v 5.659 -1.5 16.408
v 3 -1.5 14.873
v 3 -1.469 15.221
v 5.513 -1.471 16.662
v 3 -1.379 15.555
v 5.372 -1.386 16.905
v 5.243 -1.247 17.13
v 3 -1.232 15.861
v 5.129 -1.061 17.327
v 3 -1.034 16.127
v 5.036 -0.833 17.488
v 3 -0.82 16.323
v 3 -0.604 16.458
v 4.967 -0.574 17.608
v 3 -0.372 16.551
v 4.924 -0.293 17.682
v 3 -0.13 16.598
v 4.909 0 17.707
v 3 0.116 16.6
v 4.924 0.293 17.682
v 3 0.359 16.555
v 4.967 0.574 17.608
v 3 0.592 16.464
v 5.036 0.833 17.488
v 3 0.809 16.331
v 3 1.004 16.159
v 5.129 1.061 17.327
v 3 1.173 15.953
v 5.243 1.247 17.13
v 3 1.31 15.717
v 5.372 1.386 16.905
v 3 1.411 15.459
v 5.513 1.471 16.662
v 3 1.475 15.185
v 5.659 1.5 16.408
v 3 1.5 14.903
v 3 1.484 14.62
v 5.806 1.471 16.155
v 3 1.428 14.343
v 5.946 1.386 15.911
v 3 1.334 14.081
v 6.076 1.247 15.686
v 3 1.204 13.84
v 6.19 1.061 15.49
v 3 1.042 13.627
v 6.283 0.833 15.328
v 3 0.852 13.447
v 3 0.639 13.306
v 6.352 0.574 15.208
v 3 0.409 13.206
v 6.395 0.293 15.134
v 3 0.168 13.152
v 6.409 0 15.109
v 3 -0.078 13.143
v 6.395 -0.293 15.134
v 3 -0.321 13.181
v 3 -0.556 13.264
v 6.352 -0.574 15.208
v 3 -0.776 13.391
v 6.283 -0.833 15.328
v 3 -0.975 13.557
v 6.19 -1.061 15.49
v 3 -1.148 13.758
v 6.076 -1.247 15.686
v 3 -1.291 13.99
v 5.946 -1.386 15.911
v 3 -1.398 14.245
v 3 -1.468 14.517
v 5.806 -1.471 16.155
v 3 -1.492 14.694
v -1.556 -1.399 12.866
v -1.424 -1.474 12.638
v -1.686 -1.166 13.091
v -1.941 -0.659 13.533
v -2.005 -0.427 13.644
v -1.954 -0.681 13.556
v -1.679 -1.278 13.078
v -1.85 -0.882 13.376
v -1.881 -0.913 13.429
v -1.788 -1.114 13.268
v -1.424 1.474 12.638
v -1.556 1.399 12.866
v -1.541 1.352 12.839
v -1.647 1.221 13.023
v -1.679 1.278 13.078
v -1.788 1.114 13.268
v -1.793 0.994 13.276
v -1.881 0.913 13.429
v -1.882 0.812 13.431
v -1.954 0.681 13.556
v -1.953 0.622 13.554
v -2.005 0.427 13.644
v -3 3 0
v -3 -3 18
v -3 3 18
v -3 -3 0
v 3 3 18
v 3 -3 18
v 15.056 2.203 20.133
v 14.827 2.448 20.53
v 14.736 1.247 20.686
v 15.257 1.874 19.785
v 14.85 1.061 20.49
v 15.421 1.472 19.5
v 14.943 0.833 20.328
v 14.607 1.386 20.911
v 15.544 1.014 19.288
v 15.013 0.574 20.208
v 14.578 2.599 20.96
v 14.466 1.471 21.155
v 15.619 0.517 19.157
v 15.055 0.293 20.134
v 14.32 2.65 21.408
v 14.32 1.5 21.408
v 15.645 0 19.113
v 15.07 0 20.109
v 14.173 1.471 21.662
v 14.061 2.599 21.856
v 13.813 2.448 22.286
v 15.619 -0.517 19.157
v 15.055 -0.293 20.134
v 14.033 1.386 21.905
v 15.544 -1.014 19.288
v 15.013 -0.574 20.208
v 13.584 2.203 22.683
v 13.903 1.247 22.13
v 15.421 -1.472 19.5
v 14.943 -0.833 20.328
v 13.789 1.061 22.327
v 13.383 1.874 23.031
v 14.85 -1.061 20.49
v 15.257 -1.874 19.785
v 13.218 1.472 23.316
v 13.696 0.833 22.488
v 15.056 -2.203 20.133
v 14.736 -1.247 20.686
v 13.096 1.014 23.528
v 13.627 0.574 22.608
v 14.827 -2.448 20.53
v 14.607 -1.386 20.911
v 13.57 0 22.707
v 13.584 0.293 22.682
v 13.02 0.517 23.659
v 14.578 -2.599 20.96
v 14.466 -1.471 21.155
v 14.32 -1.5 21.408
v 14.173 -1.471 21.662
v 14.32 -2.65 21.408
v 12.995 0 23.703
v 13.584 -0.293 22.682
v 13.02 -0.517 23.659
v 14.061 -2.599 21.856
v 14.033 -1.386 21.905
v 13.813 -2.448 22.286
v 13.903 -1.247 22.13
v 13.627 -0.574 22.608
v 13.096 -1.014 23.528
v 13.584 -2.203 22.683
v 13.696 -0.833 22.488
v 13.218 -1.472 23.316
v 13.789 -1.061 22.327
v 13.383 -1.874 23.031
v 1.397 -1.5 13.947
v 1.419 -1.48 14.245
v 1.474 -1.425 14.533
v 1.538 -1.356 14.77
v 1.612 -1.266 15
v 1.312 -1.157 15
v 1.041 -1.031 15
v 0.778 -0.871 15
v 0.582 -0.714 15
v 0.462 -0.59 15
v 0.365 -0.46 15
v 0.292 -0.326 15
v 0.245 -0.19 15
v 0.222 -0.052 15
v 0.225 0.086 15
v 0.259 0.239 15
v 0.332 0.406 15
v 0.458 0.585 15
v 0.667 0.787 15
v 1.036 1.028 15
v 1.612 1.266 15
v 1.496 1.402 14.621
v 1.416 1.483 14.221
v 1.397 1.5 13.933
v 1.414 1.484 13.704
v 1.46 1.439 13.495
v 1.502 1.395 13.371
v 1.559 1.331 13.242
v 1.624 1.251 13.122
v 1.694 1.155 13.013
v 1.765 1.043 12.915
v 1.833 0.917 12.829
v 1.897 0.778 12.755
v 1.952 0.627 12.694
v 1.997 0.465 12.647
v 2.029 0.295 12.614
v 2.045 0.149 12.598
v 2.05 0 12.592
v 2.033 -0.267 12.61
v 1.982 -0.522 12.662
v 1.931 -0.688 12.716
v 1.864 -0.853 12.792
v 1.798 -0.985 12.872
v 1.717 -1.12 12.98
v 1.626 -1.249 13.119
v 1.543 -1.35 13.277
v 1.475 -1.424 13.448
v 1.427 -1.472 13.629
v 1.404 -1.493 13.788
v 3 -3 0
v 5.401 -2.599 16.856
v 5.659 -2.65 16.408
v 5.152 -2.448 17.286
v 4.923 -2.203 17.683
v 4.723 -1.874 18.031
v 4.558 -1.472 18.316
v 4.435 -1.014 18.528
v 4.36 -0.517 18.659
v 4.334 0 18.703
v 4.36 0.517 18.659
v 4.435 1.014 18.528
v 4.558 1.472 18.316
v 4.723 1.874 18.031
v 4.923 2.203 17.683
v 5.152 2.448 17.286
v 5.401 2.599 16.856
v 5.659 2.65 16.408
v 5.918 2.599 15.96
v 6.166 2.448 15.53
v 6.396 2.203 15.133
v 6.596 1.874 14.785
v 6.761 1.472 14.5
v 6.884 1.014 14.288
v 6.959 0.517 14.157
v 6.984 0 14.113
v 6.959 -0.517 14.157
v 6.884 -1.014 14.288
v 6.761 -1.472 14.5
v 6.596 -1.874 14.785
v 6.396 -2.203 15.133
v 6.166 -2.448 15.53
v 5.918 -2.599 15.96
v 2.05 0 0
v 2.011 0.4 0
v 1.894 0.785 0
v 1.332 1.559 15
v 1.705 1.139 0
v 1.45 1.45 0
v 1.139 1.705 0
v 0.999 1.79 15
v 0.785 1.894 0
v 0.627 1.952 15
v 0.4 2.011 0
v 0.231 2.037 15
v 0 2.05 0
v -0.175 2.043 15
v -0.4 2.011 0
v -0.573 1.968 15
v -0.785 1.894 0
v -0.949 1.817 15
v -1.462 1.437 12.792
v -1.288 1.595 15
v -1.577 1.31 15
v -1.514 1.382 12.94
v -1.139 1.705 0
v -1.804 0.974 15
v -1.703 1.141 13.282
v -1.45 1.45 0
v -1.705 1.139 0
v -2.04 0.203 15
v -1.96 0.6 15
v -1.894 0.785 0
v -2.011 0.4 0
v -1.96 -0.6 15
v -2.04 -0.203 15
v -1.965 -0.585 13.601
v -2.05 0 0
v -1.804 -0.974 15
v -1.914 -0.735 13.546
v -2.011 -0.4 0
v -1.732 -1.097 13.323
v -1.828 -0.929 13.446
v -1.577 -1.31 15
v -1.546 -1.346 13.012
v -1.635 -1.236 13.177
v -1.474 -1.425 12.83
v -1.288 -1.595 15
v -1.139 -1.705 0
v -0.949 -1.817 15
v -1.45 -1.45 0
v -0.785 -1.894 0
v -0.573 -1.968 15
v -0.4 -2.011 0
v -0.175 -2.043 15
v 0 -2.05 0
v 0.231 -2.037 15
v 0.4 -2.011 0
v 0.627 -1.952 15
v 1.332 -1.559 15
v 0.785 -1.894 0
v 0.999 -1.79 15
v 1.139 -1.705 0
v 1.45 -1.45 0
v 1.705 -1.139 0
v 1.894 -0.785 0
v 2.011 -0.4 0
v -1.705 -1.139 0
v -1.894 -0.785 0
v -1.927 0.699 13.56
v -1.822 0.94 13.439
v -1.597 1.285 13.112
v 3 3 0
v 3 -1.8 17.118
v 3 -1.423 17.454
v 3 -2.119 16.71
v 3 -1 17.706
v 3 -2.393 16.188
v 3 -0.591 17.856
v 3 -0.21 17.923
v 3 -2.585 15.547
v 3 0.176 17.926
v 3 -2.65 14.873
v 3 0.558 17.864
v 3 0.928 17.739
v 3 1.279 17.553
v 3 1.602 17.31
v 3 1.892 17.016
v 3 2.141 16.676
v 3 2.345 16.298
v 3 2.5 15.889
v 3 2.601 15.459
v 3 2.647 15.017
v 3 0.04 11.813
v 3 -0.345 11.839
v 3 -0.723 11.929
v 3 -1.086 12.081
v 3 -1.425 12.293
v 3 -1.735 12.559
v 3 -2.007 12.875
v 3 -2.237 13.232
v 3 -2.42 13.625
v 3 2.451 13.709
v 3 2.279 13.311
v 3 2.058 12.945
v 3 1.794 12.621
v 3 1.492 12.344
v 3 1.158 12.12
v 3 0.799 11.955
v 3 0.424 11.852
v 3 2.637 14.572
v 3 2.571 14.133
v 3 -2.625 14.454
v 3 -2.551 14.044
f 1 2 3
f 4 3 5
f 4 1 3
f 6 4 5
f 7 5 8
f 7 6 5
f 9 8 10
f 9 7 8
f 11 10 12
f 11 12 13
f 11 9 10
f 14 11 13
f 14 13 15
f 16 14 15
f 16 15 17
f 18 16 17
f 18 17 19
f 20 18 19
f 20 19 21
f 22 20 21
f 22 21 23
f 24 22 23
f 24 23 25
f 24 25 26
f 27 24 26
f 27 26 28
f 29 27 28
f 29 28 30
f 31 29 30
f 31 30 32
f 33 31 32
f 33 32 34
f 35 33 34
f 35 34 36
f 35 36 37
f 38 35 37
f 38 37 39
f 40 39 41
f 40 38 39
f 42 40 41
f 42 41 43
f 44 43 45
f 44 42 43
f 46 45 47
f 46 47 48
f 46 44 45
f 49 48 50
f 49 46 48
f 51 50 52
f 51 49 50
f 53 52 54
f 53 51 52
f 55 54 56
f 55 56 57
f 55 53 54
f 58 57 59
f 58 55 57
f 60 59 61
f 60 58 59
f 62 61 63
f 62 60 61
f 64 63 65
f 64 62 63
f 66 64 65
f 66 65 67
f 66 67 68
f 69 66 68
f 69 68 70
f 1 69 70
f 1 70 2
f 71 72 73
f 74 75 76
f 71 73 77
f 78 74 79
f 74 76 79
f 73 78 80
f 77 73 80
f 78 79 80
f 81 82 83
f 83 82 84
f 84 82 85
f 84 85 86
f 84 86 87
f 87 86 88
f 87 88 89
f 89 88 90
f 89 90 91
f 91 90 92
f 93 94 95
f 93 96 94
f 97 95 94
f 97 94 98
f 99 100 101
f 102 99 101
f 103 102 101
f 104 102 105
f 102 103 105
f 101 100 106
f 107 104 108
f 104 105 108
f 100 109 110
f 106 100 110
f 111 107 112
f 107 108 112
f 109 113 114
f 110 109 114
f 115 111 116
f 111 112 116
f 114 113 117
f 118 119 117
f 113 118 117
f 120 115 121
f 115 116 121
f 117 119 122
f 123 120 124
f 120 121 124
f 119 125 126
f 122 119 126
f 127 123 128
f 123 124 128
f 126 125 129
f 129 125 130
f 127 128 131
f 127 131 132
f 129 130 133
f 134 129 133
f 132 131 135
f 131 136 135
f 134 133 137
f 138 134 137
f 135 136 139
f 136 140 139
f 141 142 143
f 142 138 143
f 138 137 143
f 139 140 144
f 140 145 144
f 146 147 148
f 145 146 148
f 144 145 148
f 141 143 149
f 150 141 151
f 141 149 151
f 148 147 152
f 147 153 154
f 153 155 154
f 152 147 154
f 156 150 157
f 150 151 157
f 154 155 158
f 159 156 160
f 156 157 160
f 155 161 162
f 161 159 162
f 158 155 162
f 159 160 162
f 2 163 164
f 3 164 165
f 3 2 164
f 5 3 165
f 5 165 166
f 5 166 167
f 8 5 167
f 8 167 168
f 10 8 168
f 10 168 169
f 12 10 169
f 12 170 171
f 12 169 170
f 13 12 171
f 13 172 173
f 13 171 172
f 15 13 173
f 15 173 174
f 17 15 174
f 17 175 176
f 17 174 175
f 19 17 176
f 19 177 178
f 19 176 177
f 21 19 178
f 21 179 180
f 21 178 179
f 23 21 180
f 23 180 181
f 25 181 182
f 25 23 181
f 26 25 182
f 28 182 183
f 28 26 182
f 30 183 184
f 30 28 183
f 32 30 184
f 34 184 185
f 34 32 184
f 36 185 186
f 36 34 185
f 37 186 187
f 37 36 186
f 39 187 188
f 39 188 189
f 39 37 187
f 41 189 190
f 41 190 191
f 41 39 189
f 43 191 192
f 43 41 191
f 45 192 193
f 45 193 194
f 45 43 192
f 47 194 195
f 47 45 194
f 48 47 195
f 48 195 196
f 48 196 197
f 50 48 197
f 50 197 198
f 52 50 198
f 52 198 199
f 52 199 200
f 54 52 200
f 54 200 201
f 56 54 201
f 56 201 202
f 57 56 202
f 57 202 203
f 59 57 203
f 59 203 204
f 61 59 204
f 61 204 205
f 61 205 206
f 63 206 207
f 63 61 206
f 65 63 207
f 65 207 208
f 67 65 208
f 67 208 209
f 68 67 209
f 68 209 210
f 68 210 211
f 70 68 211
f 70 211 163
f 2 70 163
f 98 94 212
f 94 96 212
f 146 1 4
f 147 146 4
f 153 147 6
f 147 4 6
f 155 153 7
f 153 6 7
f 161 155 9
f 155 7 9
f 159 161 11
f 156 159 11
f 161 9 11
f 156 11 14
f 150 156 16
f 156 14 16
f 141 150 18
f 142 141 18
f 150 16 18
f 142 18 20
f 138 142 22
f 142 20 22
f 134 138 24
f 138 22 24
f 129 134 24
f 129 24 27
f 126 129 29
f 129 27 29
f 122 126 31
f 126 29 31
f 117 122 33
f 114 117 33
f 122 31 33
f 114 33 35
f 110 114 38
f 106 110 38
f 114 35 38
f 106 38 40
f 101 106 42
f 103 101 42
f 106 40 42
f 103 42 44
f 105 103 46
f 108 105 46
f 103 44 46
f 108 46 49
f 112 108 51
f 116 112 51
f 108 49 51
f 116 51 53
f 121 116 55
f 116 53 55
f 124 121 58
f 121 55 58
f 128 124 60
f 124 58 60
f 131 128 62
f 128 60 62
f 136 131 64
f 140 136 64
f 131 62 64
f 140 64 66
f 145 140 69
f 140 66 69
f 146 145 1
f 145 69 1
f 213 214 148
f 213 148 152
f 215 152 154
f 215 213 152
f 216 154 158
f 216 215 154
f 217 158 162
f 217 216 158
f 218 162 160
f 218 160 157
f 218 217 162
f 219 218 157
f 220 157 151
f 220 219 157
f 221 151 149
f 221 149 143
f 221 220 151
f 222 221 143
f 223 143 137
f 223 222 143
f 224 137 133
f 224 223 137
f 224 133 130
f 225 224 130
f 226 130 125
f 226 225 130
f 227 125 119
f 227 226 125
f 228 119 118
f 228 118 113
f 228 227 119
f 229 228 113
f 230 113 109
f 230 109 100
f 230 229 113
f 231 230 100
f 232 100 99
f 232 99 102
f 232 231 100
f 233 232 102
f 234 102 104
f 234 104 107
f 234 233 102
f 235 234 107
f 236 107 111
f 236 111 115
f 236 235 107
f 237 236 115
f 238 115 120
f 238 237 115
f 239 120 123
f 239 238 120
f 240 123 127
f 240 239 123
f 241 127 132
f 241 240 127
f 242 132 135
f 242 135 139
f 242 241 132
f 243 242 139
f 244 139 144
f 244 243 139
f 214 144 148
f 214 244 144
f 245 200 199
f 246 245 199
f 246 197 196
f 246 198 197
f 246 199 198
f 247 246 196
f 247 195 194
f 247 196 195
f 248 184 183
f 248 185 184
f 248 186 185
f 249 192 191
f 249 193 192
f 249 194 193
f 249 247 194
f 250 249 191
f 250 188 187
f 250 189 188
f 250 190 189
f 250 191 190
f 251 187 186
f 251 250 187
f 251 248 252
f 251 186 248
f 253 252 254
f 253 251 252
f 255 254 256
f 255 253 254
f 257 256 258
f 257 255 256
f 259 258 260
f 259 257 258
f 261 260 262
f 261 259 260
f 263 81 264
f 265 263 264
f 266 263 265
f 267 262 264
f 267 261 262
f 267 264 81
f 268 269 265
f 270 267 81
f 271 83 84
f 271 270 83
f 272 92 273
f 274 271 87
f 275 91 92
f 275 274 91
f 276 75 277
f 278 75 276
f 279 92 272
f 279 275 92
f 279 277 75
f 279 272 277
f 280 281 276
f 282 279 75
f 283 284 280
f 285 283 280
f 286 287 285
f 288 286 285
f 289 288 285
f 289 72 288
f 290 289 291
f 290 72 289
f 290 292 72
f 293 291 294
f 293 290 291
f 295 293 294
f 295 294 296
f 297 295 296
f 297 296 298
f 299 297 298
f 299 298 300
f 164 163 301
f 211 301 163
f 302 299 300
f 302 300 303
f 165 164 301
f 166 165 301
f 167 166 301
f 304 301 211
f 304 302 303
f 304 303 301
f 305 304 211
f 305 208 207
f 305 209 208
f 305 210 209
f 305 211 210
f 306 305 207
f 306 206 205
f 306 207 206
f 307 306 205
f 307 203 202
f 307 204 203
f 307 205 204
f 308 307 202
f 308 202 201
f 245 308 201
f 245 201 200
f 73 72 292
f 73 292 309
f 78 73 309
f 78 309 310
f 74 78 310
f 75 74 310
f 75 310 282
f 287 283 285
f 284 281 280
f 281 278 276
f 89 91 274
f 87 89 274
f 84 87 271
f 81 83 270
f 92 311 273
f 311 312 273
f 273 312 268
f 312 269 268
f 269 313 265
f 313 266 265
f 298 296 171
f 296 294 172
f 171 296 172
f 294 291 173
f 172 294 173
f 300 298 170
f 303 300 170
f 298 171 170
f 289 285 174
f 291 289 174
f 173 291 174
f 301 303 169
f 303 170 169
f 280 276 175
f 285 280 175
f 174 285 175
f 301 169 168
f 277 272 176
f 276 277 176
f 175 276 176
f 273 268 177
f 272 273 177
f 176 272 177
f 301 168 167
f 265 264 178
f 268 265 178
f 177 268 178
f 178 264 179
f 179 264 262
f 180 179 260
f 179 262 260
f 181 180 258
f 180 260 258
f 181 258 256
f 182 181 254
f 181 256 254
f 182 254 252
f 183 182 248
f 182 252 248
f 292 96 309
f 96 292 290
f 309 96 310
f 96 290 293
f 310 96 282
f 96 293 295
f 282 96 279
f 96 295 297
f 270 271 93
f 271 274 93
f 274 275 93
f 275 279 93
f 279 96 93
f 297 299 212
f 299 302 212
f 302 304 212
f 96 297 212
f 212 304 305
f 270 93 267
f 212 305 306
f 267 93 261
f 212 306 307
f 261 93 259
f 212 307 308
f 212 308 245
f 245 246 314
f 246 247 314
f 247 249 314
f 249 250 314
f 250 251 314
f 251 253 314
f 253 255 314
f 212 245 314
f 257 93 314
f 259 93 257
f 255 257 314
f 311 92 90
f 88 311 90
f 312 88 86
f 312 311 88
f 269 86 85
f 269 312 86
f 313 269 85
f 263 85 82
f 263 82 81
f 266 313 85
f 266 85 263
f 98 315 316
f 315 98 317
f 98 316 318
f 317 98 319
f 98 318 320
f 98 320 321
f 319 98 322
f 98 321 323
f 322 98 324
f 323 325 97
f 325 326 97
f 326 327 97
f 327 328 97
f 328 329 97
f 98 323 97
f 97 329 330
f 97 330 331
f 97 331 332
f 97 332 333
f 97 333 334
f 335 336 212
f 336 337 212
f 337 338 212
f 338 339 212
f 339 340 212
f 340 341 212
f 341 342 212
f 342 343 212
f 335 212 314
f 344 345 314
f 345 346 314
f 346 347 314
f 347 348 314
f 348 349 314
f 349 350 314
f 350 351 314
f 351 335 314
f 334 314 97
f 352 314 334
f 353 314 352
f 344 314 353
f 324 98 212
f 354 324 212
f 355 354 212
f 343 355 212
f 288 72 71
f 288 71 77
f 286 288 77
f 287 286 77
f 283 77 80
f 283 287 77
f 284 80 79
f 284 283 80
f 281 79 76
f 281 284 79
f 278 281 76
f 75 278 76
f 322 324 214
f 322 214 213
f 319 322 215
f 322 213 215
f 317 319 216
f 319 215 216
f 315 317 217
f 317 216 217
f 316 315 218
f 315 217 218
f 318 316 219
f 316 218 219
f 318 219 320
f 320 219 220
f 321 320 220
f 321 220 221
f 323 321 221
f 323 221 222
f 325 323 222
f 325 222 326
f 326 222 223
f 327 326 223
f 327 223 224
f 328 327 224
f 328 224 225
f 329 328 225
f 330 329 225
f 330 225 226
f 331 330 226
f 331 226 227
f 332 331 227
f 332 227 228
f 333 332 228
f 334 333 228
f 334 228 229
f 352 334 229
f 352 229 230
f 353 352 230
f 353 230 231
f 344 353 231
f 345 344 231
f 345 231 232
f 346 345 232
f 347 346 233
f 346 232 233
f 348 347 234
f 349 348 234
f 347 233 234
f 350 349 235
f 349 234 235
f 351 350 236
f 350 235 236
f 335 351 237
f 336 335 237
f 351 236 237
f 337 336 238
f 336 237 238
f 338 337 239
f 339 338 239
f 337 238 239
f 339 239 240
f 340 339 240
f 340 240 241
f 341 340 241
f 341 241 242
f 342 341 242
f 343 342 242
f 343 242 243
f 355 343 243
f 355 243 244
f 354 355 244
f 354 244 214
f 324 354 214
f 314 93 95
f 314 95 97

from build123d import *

# Parameters (mm, degrees)
F0_W      = 6
F0_H      = 6
F0_R      = 2.05
F1_DEPTH  = 15
F3_W      = 6
F3_H      = 6
F4_DEPTH  = 3
F8_R      = 2.65
F8_R_2    = 1.5
F10_DEPTH = 10
F11_DEPTH = 8.02


with BuildPart() as f1:
    # F0 (on Top) → F1 (new body)
    with BuildSketch(Plane.XY):
        Rectangle(F0_W, F0_H)
        Circle(F0_R, mode=Mode.SUBTRACT)
    extrude(amount=F1_DEPTH)

    # F3 (on offset) → F4 (join)
    with BuildSketch(Plane.XY.offset(15)):
        Rectangle(F3_W, F3_H)
    extrude(amount=F4_DEPTH)

    # F8 (on offset) → F9 (join, up to the next surface of F1)
    with BuildSketch(Plane(origin=(11.349514303, 0, 6.552645138), x_dir=(0, -1, 0), z_dir=(-0.8660254038, 0, -0.5))):
        with Locations((0, 11.3801583648)):
            Circle(F8_R)
        with Locations((0, 11.3801583648)):
            Circle(F8_R_2, mode=Mode.SUBTRACT)
    extrude(until=Until.NEXT)

    # F8 (on offset) → F10 (join)
    with BuildSketch(Plane(origin=(11.349514303, 0, 6.552645138), x_dir=(0, -1, 0), z_dir=(-0.8660254038, 0, -0.5))):
        with Locations((0, 11.3801583648)):
            Circle(F8_R)
        with Locations((0, 11.3801583648)):
            Circle(F8_R_2, mode=Mode.SUBTRACT)
    extrude(amount=-F10_DEPTH)

    # F8 (on offset) → F11 (cut)
    with BuildSketch(Plane(origin=(11.349514303, 0, 6.552645138), x_dir=(0, -1, 0), z_dir=(-0.8660254038, 0, -0.5))):
        with Locations((0, 11.3801583648)):
            Circle(F8_R_2)
    extrude(amount=F11_DEPTH, mode=Mode.SUBTRACT)


solid = f1.part
